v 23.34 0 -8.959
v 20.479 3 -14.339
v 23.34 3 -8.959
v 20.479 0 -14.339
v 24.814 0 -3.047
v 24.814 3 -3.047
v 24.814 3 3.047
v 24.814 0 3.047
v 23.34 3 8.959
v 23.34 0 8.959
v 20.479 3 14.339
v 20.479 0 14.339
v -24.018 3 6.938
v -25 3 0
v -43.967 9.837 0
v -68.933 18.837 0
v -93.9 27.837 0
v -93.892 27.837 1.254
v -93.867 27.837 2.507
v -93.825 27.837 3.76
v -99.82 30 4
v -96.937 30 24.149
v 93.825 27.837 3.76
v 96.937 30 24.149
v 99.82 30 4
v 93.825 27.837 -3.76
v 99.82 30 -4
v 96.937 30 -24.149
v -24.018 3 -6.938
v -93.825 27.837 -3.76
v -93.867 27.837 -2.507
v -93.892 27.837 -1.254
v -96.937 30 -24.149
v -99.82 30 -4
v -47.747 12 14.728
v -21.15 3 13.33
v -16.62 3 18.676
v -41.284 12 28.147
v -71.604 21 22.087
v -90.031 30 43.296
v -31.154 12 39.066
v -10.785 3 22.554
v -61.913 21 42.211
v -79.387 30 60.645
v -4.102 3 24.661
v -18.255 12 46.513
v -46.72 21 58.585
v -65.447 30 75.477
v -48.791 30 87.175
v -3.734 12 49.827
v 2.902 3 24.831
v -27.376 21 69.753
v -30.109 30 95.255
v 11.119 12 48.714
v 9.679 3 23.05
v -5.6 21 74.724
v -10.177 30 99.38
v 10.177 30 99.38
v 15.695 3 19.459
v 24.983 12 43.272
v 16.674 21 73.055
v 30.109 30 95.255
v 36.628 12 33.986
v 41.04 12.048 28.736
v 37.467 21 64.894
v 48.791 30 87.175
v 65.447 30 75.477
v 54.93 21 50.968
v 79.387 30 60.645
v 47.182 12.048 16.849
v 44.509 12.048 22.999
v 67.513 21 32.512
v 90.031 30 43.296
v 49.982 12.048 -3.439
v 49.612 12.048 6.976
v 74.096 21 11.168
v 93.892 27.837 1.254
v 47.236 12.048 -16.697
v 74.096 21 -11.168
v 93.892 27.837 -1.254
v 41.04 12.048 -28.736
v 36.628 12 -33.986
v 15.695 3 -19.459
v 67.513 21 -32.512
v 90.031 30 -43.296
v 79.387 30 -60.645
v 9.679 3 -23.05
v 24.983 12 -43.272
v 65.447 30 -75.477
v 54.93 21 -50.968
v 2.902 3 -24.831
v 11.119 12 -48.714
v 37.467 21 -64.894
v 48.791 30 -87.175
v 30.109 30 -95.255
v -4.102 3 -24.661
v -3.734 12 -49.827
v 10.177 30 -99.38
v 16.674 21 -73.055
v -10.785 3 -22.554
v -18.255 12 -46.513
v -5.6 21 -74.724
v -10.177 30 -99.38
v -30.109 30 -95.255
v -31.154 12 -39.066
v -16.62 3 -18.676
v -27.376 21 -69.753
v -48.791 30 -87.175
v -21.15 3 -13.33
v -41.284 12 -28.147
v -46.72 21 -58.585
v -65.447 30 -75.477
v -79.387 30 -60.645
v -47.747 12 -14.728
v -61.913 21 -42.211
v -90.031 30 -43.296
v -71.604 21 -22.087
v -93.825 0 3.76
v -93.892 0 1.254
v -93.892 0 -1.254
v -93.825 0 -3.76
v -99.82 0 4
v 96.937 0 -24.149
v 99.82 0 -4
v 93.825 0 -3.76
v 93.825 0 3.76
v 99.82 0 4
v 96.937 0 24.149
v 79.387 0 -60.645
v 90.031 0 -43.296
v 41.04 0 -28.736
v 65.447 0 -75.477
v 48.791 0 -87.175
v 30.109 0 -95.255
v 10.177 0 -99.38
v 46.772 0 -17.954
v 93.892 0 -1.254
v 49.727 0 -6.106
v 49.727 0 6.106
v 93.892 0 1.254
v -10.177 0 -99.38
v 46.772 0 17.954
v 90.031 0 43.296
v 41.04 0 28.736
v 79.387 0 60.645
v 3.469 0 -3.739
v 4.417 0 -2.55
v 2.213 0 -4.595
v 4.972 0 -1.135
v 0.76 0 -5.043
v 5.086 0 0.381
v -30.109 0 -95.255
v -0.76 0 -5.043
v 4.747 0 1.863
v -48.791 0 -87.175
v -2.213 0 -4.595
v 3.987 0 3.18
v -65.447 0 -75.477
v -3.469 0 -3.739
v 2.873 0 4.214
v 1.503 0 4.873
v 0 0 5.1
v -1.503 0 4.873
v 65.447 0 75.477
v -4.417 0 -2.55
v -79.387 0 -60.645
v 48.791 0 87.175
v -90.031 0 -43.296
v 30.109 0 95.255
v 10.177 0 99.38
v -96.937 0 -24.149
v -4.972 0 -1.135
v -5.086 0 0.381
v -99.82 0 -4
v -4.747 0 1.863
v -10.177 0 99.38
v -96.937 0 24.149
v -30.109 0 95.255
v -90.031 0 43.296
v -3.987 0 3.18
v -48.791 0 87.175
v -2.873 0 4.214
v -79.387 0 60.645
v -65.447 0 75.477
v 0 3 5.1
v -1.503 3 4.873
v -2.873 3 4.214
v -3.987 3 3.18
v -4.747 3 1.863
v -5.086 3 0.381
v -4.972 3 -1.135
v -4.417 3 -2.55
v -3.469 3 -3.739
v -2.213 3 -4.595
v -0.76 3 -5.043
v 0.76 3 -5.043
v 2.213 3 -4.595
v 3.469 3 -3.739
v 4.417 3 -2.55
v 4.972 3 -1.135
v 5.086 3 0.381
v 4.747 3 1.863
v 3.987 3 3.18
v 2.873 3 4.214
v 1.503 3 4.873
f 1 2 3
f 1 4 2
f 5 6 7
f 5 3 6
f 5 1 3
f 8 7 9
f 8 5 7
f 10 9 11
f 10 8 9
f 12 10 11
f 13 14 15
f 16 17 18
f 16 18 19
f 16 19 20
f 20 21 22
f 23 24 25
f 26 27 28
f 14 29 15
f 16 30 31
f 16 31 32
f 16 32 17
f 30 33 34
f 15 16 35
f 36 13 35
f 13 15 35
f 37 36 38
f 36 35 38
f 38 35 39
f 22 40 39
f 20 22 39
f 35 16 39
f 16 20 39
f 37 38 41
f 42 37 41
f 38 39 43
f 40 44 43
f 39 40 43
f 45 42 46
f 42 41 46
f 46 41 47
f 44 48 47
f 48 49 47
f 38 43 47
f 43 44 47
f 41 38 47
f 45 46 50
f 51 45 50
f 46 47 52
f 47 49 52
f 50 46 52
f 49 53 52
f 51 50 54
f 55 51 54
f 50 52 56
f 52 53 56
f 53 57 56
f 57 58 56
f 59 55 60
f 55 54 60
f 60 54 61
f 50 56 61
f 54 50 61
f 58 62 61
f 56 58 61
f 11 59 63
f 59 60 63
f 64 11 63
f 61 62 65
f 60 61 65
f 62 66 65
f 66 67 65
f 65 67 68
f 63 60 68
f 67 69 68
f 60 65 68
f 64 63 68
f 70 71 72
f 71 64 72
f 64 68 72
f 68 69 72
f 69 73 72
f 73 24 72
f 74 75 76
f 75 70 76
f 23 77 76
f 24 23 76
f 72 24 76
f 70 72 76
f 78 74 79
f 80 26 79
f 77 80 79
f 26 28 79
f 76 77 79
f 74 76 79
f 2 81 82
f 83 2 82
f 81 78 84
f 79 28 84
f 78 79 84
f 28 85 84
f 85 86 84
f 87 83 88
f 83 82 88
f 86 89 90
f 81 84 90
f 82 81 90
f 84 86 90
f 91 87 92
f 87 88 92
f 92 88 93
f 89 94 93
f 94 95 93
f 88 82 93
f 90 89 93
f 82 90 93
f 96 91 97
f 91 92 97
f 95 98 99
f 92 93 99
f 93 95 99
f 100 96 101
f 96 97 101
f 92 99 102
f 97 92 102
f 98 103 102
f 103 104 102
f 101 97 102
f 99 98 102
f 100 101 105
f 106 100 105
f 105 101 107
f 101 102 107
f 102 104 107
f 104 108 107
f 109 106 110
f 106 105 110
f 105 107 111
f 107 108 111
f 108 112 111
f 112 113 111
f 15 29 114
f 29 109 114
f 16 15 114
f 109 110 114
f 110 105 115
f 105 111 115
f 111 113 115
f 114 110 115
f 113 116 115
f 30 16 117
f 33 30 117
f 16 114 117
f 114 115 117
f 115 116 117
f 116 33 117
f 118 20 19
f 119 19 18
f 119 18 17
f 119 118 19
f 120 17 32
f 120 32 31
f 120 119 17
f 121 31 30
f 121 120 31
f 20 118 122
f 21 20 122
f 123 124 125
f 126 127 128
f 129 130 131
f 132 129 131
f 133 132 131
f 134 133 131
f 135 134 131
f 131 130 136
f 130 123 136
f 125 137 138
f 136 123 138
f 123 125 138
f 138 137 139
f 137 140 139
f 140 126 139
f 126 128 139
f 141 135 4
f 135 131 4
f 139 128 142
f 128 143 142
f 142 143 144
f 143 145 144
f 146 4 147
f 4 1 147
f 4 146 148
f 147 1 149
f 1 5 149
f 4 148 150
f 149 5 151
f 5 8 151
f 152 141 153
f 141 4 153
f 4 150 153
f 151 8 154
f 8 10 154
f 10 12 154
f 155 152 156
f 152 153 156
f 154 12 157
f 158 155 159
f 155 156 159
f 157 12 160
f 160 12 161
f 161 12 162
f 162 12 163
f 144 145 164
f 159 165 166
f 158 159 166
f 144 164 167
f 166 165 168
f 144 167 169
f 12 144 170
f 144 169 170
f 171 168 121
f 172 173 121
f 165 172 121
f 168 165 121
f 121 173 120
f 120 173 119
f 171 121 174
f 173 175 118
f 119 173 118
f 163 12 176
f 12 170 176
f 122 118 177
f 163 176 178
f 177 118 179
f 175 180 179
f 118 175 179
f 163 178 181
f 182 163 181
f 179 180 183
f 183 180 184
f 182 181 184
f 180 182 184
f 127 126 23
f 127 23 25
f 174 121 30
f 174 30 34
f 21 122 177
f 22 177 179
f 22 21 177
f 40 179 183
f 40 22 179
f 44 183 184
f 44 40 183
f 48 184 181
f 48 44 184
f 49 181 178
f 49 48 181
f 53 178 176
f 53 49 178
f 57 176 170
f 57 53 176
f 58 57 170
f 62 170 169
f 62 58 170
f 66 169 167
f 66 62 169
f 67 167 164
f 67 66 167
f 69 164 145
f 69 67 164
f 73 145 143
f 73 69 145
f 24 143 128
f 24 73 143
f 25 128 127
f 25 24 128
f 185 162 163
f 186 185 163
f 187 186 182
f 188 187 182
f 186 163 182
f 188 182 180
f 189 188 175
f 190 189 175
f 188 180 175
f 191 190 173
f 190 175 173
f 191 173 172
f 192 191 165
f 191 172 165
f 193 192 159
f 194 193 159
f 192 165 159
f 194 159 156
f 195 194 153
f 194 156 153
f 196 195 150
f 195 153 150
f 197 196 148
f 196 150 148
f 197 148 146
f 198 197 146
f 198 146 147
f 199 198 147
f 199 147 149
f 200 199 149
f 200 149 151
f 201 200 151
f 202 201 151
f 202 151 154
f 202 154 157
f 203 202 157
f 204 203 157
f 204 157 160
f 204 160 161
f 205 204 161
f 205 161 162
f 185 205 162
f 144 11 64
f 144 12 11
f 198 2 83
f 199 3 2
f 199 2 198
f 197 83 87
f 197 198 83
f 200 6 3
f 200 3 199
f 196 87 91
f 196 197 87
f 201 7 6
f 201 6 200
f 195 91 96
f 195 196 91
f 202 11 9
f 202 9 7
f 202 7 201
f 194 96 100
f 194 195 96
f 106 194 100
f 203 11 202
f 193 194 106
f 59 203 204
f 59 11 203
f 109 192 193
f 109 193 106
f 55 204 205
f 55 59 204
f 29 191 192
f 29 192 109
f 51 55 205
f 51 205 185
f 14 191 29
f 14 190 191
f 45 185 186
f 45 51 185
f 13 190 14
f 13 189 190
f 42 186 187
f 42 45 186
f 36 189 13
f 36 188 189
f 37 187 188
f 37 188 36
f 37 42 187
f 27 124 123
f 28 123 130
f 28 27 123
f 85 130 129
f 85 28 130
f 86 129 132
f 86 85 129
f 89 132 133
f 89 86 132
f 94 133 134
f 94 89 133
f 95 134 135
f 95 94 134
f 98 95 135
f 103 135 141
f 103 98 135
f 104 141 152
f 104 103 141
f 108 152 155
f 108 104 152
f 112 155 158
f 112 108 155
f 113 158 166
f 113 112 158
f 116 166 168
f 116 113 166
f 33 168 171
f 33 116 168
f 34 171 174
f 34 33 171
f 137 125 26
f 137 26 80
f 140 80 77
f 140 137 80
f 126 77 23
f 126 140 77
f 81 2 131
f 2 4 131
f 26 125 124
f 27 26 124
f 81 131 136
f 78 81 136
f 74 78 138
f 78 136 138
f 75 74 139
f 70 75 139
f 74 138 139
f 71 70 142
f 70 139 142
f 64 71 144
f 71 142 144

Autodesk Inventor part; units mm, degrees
ref_plane "YZ Plane" through (0, 0, 0) normal (1, 0, 0) x (0, 1, 0)
ref_plane "XZ Plane" through (0, 0, 0) normal (0, 1, 0) x (-1, 0, 0)
ref_plane "XY Plane" through (0, 0, 0) normal (0, 0, 1) x (1, 0, 0)
sketch "Sketch2" plane through (0, 0, 0) normal (0, 0, 1) x (1, 0, 0)
  line L0 (-50, 0) -> (-99.9, 0)
  line L1 (-99.9, 0) -> (-99.9, 30)
  line L2 (0, 0) -> (0, 50.0549)
  line L3 (-99.9, 30) -> (-25, 3)
  line L4 (-50, 0) -> (0, 0)
  line L5 (-25, 3) -> (0, 3)
  line L6 (0, 3) -> (0, 0)
  point P0 (-99.9, 15)
  dimension "d2" = 30
  dimension "d6" = 199.8
  dimension "d15" = 50
  dimension "d16" = 3
revolve "Revolution1" add sketch "Sketch2" angle 360 about axis through (0, 0, 0) along (0, 1, 0)
sketch "Sketch3" plane through (0, 0, 0) normal (0, -1, 0) x (1, 0, 0)
  circle A0 centre (0, 0) radius 99.9 projected
  line L0 (0, 0) -> (99.8199, 4)
  line L1 (0, 0) -> (99.8199, -4)
  line L2 (0, 0) -> (99.9, 0) construction
  line L3 (11.4718, 0) -> (11.4718, -0.4597) construction
  line L4 (11.4718, 0) -> (11.4718, 0.4597) construction
  circle A1 centre (0, 0) radius 93.9
  point P0 (93.8247, 3.7598)
  point P1 (93.8247, -3.7598)
  dimension "d8" = 8
  dimension "d9" = 6
extrude "Extrusion1" cut sketch "Sketch3" against normal through all contours A0 L1 A1 L0 picked at (97.8363, 3.4756)
pattern_circular "Circular Pattern1" count 2 over 360 about axis through (0, 16.5, 0) along (0, 1, 0) of "Extrusion1"
sketch "Sketch5" plane through (0, 3, 0) normal (0, 1, 0) x (1, 0, 0)
  point P0 (0, 0)
  point P1 (0, 0)
hole "Hole1" at (0, 3, 0) direction (0, -1, 0) diameter 10.2 end through all
sketch "Sketch6" plane through (0, 0, 0) normal (0, -1, 0) x (1, 0, 0)
  line L0 (0, 0) -> (93.9, 0) construction
  arc A0 (93.8247, -3.7598) -> (93.8247, 3.7598) centre (0, 0) ccw projected
  arc A1 (41.0395, -28.7362) -> (41.0395, 28.7362) centre (0, 0) ccw
  line L1 (0, 0) -> (41.0395, 28.7362)
  line L2 (0, 0) -> (41.0395, -28.7362)
  line L3 (16.9605, 0) -> (16.9605, 11.8759) construction
  line L4 (16.9605, 0) -> (16.9605, -11.8759) construction
  arc A2 (20.4788, -14.3394) -> (20.4788, 14.3394) centre (0, 0) ccw
  point P0 (25, 0)
  dimension "d30" = 50.1
  dimension "d31" = 70
  dimension "d32" = 25
extrude "Extrusion3" cut sketch "Sketch6" against normal through all contours L2 A2 L1 A1
properties part number "feeder"
